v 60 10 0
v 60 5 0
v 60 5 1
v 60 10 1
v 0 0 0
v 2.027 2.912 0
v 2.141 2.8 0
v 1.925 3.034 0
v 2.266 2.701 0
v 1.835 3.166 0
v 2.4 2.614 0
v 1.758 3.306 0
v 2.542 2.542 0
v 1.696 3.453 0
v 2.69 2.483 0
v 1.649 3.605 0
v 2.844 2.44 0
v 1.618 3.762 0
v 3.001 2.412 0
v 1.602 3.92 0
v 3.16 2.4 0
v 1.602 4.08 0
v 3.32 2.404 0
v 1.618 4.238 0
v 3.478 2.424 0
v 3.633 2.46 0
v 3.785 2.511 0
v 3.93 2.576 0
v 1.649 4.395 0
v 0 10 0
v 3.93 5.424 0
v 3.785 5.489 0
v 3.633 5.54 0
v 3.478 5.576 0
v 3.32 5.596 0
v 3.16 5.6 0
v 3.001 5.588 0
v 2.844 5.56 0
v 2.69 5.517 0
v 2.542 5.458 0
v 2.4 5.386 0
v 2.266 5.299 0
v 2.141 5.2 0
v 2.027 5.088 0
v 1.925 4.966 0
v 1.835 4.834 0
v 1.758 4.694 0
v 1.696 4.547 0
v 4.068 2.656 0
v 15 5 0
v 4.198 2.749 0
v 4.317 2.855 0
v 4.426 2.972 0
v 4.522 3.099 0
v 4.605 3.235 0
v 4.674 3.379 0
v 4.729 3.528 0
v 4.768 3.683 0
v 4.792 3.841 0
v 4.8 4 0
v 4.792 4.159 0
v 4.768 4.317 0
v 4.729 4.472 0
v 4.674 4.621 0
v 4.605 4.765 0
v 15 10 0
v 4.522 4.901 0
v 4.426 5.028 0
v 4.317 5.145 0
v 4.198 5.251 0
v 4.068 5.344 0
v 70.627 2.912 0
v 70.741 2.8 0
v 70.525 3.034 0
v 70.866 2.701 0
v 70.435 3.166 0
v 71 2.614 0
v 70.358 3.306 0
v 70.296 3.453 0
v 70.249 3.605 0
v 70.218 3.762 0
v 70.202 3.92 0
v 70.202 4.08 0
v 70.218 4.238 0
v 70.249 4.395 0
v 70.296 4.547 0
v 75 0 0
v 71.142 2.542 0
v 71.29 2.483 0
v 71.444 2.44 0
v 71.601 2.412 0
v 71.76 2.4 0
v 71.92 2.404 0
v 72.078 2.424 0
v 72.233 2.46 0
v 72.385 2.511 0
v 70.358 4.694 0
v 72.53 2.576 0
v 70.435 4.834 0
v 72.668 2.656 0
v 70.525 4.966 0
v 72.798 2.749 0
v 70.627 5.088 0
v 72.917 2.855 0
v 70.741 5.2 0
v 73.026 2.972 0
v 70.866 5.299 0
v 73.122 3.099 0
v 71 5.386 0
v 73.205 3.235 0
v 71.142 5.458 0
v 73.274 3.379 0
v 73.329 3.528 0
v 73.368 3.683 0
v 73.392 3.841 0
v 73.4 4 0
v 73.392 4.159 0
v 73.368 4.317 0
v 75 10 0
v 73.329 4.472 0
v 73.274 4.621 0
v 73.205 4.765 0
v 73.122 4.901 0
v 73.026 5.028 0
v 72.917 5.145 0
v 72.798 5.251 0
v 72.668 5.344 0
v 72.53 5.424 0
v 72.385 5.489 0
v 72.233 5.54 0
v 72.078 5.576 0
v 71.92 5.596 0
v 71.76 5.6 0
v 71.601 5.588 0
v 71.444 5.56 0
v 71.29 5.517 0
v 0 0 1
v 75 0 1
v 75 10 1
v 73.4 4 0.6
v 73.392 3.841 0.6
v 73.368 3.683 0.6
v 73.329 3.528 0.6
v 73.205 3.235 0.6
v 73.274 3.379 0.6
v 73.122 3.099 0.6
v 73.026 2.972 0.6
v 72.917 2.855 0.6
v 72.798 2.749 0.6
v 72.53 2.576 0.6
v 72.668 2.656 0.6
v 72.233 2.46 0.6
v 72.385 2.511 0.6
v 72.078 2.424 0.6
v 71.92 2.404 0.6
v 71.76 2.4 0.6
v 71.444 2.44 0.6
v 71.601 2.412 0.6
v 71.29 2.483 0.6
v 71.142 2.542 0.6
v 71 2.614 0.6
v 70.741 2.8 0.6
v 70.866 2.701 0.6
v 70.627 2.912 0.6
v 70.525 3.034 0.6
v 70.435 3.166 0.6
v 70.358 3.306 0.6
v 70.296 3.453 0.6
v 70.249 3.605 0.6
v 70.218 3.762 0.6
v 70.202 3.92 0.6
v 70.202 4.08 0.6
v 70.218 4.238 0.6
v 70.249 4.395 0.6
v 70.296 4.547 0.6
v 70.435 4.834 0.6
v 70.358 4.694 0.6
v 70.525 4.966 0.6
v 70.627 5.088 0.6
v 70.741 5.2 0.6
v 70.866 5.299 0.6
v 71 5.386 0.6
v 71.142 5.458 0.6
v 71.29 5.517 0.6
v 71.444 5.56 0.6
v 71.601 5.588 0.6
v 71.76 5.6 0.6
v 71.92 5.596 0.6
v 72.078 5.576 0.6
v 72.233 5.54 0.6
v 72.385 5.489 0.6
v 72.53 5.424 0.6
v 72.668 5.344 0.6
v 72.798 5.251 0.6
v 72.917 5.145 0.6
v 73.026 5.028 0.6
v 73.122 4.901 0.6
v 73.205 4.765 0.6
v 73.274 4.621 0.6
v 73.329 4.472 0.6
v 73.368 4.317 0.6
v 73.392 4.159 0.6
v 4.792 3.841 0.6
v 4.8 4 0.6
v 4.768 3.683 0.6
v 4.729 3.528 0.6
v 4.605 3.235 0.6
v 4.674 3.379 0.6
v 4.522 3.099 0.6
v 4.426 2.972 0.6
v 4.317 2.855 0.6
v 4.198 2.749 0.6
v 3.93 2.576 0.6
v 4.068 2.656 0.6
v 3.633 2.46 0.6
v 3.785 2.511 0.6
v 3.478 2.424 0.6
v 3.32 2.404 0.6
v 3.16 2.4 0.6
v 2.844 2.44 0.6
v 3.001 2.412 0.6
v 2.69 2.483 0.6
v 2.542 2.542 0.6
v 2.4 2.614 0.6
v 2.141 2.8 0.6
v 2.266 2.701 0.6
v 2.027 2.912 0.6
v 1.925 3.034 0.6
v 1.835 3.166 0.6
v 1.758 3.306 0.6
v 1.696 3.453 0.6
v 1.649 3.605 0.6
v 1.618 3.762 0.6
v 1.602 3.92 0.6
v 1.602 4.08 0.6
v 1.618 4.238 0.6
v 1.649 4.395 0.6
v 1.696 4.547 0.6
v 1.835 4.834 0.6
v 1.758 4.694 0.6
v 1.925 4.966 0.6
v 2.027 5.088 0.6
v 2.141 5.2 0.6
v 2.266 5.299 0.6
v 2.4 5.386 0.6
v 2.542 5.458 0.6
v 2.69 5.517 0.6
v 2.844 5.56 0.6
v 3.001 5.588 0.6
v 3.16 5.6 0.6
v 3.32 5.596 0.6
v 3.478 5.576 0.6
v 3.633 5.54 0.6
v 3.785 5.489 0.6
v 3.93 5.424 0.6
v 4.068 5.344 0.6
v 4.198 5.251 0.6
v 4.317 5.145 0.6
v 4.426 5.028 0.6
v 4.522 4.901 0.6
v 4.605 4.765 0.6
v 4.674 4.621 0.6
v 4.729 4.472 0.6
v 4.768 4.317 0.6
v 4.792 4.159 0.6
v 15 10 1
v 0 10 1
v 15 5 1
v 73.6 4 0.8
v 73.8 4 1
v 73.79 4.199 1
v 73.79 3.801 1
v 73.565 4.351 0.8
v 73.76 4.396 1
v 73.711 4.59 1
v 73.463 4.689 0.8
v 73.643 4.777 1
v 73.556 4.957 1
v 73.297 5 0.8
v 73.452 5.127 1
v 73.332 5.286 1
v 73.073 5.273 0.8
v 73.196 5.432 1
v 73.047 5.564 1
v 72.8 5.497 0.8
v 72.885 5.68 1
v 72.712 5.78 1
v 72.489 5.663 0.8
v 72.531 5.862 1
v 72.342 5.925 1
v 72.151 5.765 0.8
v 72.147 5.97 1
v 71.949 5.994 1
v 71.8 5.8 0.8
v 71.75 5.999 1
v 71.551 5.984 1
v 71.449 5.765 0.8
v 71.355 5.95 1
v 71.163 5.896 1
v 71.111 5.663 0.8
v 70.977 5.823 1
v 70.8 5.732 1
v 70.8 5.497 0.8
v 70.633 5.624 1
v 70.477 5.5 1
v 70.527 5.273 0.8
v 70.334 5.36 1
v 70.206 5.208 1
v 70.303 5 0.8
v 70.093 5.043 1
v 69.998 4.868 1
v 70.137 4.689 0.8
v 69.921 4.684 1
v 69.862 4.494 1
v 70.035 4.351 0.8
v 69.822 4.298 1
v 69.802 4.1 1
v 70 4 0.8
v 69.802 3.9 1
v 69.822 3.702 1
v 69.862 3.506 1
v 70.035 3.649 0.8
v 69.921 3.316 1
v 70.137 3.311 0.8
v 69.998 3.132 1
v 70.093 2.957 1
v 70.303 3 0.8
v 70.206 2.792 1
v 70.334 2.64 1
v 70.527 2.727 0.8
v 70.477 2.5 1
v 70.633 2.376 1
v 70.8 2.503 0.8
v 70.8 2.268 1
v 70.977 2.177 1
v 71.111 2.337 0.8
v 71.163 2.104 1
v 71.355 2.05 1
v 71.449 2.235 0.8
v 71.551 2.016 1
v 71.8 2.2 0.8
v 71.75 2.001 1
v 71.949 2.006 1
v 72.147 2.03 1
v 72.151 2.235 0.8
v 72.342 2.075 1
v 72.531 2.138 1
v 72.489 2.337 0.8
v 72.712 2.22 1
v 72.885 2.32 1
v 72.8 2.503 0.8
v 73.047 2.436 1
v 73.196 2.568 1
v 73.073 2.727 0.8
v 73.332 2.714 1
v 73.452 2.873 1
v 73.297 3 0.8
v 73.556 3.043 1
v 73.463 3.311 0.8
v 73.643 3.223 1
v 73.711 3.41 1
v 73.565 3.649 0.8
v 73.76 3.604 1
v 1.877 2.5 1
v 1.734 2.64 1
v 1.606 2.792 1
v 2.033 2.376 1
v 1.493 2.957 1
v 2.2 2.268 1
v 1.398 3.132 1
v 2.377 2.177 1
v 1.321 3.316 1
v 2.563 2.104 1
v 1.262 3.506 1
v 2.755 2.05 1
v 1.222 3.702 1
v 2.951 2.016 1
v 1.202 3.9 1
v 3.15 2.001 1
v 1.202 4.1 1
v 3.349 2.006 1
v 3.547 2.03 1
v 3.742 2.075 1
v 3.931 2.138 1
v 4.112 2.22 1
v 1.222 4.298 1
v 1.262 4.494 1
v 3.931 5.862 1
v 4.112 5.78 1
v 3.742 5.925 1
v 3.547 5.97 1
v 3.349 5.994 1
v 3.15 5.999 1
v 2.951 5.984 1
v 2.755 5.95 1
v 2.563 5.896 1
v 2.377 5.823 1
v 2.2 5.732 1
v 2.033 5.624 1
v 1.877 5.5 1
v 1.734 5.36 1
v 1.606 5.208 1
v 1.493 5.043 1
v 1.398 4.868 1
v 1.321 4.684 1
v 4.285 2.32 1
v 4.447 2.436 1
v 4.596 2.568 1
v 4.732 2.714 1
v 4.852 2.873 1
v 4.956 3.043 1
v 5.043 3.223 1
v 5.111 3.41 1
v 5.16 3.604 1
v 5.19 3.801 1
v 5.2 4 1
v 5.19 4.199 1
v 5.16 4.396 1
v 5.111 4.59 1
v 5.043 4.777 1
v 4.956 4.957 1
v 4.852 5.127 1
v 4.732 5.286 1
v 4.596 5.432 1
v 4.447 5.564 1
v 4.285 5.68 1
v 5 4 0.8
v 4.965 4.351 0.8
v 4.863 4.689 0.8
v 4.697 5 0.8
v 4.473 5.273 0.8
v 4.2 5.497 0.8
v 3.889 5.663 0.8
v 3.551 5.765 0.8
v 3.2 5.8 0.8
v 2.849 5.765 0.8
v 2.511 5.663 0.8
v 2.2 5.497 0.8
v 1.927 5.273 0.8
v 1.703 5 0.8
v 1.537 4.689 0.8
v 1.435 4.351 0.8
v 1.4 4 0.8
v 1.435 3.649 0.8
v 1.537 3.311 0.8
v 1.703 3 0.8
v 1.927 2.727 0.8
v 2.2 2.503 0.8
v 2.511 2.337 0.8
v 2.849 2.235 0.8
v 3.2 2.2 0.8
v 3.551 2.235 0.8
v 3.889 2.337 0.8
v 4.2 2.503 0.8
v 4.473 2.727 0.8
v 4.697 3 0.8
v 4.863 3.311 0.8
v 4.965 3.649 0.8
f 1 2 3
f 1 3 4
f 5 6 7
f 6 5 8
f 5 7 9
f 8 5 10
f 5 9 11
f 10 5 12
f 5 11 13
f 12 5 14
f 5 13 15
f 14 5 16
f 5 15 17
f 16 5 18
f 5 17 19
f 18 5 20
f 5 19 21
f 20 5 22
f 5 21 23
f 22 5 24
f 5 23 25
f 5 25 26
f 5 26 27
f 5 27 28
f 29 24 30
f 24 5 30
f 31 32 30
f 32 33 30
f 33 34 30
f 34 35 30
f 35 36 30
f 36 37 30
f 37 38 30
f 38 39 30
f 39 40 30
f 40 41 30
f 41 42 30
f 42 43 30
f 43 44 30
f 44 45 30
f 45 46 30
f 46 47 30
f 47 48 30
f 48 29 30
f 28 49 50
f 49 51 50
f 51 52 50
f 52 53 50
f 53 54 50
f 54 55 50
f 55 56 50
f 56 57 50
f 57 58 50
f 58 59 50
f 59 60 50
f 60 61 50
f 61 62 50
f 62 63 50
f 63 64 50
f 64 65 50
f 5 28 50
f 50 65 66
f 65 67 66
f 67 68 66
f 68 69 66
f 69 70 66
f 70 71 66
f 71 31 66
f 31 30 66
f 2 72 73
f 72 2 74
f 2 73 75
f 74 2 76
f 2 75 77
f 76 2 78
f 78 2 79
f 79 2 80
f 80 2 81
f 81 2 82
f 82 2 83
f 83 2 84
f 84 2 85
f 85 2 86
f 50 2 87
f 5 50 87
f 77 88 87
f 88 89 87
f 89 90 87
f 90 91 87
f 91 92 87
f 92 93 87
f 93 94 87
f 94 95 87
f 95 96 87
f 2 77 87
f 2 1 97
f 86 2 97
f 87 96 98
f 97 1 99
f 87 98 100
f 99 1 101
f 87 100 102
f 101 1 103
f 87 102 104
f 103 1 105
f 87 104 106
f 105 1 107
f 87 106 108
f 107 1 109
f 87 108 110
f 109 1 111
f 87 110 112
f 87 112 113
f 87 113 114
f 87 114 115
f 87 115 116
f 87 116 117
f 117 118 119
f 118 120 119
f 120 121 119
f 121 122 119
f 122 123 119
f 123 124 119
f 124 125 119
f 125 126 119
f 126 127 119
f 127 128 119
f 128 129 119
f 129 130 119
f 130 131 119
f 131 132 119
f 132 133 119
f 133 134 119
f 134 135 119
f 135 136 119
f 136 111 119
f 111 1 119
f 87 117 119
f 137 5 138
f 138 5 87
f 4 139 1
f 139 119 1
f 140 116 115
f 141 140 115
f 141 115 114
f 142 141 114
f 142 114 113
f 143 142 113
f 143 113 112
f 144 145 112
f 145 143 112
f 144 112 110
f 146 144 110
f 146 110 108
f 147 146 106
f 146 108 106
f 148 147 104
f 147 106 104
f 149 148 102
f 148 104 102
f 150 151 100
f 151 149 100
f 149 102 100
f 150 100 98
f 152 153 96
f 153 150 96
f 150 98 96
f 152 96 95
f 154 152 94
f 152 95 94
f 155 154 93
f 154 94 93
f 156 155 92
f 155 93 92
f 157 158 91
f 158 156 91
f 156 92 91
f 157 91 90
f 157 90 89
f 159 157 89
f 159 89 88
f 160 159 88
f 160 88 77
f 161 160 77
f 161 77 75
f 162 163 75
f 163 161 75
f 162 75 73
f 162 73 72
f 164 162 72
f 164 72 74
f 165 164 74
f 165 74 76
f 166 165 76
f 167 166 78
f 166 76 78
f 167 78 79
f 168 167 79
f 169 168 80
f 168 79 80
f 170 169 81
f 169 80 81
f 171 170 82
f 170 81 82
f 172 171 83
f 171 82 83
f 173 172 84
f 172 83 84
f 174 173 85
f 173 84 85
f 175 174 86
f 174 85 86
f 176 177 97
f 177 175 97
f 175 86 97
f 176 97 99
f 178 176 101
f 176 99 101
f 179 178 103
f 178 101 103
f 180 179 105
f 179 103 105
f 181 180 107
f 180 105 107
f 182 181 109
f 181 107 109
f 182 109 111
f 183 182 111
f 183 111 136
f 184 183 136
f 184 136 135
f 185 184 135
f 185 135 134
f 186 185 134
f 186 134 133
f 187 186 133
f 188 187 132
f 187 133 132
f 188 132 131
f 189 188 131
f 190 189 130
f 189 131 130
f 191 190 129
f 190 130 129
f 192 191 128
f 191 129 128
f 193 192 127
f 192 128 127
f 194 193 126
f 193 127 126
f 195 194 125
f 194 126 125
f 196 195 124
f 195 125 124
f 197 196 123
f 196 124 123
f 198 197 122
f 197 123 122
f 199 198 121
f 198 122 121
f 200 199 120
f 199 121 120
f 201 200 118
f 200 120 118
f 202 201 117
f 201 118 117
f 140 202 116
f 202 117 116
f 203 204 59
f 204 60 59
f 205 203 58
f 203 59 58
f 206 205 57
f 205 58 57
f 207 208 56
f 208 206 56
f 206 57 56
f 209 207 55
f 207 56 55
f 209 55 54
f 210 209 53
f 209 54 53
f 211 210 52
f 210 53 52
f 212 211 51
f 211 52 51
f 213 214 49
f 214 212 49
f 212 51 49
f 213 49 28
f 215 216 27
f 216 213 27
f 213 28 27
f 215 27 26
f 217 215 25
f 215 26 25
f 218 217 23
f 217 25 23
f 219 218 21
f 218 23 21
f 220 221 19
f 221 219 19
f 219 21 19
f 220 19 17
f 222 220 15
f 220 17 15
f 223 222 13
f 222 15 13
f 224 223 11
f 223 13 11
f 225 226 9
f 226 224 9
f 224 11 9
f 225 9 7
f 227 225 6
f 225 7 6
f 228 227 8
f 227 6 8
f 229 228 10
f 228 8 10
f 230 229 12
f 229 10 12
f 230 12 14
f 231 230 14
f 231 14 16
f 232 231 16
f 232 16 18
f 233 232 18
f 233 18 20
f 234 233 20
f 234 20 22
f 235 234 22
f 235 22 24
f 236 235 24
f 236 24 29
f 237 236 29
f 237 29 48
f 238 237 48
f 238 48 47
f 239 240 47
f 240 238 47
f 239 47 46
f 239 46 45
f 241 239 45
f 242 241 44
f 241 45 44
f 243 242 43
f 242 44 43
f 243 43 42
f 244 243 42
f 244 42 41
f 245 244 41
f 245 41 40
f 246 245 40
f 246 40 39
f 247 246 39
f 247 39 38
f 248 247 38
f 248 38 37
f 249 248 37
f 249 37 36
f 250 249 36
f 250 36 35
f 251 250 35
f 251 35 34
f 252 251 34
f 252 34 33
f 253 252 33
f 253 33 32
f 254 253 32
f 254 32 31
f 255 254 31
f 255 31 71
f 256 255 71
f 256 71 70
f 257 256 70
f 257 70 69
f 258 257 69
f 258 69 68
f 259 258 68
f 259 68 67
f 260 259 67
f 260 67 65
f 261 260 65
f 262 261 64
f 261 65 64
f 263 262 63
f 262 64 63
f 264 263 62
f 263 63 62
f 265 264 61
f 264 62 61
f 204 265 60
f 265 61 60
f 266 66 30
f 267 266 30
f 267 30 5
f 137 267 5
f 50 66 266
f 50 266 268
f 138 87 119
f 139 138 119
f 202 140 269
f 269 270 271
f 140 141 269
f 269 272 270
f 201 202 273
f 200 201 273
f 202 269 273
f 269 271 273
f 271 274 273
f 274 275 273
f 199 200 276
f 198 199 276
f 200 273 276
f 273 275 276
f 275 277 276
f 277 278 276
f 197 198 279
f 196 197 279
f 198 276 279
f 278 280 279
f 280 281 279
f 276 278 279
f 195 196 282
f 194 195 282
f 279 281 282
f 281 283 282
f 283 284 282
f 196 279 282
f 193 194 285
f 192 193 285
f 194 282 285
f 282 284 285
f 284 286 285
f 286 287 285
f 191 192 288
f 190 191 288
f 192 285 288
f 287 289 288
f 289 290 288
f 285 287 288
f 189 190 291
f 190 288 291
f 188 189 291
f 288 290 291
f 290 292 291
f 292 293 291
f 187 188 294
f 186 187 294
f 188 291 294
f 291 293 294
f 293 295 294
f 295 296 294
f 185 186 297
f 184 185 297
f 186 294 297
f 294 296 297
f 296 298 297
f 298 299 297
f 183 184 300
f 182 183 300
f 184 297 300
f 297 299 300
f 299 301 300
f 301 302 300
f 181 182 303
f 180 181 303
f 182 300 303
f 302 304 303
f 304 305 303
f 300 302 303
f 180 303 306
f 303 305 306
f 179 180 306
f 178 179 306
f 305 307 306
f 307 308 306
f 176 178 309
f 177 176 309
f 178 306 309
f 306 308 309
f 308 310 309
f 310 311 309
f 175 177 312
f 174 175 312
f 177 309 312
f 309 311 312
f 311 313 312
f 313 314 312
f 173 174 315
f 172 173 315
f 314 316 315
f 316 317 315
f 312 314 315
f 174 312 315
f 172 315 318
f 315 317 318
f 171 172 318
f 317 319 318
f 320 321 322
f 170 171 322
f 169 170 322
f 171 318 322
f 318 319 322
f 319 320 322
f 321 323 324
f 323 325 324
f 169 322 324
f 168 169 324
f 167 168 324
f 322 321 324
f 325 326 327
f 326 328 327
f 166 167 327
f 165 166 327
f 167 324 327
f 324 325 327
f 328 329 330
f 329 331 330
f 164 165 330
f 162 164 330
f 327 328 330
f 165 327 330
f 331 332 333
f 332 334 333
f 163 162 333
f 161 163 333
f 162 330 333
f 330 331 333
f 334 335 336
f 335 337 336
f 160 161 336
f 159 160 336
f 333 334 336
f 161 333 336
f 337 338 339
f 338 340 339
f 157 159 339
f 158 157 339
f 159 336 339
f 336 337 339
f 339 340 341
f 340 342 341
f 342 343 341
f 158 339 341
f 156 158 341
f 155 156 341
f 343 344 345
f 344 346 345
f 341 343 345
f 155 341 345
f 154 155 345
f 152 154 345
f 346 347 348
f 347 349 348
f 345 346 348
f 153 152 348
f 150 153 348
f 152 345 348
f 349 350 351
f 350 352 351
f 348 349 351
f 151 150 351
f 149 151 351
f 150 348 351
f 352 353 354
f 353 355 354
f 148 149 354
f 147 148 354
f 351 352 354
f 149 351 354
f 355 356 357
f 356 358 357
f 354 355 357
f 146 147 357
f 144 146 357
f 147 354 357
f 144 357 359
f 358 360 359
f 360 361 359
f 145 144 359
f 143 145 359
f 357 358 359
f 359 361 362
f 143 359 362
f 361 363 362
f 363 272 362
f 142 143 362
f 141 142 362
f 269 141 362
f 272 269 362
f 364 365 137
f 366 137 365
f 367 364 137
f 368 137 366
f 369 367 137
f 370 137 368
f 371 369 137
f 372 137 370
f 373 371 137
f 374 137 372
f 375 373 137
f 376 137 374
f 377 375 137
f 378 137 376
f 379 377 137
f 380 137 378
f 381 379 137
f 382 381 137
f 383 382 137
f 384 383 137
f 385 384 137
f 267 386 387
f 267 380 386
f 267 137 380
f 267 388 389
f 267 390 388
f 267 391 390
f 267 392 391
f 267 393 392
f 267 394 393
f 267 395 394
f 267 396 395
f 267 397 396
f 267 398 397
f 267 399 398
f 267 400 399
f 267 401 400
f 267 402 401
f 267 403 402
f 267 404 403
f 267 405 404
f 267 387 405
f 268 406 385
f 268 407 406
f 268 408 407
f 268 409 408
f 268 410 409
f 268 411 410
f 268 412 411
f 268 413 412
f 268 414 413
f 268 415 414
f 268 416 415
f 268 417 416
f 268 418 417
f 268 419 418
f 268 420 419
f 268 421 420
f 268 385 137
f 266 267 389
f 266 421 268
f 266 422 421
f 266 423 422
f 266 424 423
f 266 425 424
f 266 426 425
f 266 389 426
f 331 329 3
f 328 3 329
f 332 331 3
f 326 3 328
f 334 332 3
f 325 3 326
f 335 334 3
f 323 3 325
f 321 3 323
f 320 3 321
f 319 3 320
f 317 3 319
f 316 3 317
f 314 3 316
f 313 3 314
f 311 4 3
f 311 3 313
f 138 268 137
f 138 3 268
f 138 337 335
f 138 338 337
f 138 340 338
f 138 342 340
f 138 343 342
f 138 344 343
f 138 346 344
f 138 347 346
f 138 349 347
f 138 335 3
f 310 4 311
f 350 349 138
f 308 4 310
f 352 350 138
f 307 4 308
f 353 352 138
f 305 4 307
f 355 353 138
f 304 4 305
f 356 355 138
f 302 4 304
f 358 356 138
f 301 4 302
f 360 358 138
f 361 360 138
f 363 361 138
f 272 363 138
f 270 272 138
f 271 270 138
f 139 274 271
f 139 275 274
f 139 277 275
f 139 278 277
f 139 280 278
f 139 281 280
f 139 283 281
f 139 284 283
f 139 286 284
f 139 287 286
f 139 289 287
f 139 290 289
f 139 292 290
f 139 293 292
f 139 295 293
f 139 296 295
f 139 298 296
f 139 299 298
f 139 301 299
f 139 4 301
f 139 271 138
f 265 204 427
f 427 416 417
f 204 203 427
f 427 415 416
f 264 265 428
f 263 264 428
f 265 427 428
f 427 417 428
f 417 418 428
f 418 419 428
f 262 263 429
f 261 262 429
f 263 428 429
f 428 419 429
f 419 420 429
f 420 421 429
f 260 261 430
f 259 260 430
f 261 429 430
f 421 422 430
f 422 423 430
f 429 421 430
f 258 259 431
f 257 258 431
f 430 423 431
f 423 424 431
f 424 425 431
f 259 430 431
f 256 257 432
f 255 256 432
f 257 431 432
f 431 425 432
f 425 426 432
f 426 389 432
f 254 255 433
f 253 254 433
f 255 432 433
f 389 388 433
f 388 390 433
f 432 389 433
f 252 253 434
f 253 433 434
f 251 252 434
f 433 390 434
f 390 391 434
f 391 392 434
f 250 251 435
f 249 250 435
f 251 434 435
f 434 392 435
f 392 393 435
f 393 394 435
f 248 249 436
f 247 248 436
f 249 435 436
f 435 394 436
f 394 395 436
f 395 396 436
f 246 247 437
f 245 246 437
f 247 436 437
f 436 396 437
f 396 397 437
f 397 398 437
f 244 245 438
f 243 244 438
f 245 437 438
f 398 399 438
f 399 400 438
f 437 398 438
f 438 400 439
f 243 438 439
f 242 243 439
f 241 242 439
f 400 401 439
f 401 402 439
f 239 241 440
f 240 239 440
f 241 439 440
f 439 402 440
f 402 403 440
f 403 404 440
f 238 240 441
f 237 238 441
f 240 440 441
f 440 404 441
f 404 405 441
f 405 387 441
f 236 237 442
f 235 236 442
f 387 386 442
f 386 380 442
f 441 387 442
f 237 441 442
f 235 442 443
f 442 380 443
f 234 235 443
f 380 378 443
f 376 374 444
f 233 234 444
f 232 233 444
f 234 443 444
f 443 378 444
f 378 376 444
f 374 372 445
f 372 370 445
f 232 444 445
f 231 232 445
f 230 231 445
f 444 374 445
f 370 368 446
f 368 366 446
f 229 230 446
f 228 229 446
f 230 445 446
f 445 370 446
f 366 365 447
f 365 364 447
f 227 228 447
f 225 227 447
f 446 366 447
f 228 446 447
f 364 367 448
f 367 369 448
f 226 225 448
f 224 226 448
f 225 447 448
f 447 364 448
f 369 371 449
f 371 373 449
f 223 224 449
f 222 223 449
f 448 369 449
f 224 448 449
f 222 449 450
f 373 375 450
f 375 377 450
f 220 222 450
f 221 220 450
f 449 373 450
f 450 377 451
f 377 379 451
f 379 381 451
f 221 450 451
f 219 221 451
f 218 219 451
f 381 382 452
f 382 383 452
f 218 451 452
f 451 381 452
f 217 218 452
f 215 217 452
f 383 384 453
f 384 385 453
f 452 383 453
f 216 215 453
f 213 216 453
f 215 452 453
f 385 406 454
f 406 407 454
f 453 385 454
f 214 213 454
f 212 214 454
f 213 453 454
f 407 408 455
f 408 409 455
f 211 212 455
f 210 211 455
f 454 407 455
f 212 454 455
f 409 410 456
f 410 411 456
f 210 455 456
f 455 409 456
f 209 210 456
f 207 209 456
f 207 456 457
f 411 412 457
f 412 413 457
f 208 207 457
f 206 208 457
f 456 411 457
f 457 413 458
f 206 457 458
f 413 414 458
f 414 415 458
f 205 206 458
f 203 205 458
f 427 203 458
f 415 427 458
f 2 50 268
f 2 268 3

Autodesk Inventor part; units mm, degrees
ref_plane "YZ Plane" through (0, 0, 0) normal (1, 0, 0) x (0, 1, 0)
ref_plane "XZ Plane" through (0, 0, 0) normal (0, 1, 0) x (-1, 0, 0)
ref_plane "XY Plane" through (0, 0, 0) normal (0, 0, 1) x (1, 0, 0)
sketch "Sketch1" plane through (0, 0, 0) normal (0, 0, 1) x (1, 0, 0)
  line L0 (0, 0) -> (75, 0)
  line L1 (75, 0) -> (75, 10)
  line L2 (75, 10) -> (0, 10)
  line L3 (0, 10) -> (0, 0)
  line L4 (15, 10) -> (15, 5)
  line L5 (15, 5) -> (60, 5)
  line L6 (60, 5) -> (60, 10)
  circle A0 centre (3.2, 4) radius 1.6
  line L7 (37.5, 10) -> (37.5, 6.6559) construction
  circle A1 centre (71.8, 4) radius 1.6
  point P0 (0, 5)
  dimension "d0" = 75
  dimension "d1" = 10
  dimension "d3" = 5
  dimension "d4" = 45
  dimension "d5" = 3.2
  dimension "d7" = 4
  dimension "d10" = 3.2
extrude "Extrusion1" add sketch "Sketch1" along normal blind 1 contours L3 L2 L4 L5 L6 L1 L0
chamfer "Chamfer1" distance 0.4 angle 45 2 edges at (1.6, 4, 1) (70.2, 4, 1)
properties part number "oslonka"
